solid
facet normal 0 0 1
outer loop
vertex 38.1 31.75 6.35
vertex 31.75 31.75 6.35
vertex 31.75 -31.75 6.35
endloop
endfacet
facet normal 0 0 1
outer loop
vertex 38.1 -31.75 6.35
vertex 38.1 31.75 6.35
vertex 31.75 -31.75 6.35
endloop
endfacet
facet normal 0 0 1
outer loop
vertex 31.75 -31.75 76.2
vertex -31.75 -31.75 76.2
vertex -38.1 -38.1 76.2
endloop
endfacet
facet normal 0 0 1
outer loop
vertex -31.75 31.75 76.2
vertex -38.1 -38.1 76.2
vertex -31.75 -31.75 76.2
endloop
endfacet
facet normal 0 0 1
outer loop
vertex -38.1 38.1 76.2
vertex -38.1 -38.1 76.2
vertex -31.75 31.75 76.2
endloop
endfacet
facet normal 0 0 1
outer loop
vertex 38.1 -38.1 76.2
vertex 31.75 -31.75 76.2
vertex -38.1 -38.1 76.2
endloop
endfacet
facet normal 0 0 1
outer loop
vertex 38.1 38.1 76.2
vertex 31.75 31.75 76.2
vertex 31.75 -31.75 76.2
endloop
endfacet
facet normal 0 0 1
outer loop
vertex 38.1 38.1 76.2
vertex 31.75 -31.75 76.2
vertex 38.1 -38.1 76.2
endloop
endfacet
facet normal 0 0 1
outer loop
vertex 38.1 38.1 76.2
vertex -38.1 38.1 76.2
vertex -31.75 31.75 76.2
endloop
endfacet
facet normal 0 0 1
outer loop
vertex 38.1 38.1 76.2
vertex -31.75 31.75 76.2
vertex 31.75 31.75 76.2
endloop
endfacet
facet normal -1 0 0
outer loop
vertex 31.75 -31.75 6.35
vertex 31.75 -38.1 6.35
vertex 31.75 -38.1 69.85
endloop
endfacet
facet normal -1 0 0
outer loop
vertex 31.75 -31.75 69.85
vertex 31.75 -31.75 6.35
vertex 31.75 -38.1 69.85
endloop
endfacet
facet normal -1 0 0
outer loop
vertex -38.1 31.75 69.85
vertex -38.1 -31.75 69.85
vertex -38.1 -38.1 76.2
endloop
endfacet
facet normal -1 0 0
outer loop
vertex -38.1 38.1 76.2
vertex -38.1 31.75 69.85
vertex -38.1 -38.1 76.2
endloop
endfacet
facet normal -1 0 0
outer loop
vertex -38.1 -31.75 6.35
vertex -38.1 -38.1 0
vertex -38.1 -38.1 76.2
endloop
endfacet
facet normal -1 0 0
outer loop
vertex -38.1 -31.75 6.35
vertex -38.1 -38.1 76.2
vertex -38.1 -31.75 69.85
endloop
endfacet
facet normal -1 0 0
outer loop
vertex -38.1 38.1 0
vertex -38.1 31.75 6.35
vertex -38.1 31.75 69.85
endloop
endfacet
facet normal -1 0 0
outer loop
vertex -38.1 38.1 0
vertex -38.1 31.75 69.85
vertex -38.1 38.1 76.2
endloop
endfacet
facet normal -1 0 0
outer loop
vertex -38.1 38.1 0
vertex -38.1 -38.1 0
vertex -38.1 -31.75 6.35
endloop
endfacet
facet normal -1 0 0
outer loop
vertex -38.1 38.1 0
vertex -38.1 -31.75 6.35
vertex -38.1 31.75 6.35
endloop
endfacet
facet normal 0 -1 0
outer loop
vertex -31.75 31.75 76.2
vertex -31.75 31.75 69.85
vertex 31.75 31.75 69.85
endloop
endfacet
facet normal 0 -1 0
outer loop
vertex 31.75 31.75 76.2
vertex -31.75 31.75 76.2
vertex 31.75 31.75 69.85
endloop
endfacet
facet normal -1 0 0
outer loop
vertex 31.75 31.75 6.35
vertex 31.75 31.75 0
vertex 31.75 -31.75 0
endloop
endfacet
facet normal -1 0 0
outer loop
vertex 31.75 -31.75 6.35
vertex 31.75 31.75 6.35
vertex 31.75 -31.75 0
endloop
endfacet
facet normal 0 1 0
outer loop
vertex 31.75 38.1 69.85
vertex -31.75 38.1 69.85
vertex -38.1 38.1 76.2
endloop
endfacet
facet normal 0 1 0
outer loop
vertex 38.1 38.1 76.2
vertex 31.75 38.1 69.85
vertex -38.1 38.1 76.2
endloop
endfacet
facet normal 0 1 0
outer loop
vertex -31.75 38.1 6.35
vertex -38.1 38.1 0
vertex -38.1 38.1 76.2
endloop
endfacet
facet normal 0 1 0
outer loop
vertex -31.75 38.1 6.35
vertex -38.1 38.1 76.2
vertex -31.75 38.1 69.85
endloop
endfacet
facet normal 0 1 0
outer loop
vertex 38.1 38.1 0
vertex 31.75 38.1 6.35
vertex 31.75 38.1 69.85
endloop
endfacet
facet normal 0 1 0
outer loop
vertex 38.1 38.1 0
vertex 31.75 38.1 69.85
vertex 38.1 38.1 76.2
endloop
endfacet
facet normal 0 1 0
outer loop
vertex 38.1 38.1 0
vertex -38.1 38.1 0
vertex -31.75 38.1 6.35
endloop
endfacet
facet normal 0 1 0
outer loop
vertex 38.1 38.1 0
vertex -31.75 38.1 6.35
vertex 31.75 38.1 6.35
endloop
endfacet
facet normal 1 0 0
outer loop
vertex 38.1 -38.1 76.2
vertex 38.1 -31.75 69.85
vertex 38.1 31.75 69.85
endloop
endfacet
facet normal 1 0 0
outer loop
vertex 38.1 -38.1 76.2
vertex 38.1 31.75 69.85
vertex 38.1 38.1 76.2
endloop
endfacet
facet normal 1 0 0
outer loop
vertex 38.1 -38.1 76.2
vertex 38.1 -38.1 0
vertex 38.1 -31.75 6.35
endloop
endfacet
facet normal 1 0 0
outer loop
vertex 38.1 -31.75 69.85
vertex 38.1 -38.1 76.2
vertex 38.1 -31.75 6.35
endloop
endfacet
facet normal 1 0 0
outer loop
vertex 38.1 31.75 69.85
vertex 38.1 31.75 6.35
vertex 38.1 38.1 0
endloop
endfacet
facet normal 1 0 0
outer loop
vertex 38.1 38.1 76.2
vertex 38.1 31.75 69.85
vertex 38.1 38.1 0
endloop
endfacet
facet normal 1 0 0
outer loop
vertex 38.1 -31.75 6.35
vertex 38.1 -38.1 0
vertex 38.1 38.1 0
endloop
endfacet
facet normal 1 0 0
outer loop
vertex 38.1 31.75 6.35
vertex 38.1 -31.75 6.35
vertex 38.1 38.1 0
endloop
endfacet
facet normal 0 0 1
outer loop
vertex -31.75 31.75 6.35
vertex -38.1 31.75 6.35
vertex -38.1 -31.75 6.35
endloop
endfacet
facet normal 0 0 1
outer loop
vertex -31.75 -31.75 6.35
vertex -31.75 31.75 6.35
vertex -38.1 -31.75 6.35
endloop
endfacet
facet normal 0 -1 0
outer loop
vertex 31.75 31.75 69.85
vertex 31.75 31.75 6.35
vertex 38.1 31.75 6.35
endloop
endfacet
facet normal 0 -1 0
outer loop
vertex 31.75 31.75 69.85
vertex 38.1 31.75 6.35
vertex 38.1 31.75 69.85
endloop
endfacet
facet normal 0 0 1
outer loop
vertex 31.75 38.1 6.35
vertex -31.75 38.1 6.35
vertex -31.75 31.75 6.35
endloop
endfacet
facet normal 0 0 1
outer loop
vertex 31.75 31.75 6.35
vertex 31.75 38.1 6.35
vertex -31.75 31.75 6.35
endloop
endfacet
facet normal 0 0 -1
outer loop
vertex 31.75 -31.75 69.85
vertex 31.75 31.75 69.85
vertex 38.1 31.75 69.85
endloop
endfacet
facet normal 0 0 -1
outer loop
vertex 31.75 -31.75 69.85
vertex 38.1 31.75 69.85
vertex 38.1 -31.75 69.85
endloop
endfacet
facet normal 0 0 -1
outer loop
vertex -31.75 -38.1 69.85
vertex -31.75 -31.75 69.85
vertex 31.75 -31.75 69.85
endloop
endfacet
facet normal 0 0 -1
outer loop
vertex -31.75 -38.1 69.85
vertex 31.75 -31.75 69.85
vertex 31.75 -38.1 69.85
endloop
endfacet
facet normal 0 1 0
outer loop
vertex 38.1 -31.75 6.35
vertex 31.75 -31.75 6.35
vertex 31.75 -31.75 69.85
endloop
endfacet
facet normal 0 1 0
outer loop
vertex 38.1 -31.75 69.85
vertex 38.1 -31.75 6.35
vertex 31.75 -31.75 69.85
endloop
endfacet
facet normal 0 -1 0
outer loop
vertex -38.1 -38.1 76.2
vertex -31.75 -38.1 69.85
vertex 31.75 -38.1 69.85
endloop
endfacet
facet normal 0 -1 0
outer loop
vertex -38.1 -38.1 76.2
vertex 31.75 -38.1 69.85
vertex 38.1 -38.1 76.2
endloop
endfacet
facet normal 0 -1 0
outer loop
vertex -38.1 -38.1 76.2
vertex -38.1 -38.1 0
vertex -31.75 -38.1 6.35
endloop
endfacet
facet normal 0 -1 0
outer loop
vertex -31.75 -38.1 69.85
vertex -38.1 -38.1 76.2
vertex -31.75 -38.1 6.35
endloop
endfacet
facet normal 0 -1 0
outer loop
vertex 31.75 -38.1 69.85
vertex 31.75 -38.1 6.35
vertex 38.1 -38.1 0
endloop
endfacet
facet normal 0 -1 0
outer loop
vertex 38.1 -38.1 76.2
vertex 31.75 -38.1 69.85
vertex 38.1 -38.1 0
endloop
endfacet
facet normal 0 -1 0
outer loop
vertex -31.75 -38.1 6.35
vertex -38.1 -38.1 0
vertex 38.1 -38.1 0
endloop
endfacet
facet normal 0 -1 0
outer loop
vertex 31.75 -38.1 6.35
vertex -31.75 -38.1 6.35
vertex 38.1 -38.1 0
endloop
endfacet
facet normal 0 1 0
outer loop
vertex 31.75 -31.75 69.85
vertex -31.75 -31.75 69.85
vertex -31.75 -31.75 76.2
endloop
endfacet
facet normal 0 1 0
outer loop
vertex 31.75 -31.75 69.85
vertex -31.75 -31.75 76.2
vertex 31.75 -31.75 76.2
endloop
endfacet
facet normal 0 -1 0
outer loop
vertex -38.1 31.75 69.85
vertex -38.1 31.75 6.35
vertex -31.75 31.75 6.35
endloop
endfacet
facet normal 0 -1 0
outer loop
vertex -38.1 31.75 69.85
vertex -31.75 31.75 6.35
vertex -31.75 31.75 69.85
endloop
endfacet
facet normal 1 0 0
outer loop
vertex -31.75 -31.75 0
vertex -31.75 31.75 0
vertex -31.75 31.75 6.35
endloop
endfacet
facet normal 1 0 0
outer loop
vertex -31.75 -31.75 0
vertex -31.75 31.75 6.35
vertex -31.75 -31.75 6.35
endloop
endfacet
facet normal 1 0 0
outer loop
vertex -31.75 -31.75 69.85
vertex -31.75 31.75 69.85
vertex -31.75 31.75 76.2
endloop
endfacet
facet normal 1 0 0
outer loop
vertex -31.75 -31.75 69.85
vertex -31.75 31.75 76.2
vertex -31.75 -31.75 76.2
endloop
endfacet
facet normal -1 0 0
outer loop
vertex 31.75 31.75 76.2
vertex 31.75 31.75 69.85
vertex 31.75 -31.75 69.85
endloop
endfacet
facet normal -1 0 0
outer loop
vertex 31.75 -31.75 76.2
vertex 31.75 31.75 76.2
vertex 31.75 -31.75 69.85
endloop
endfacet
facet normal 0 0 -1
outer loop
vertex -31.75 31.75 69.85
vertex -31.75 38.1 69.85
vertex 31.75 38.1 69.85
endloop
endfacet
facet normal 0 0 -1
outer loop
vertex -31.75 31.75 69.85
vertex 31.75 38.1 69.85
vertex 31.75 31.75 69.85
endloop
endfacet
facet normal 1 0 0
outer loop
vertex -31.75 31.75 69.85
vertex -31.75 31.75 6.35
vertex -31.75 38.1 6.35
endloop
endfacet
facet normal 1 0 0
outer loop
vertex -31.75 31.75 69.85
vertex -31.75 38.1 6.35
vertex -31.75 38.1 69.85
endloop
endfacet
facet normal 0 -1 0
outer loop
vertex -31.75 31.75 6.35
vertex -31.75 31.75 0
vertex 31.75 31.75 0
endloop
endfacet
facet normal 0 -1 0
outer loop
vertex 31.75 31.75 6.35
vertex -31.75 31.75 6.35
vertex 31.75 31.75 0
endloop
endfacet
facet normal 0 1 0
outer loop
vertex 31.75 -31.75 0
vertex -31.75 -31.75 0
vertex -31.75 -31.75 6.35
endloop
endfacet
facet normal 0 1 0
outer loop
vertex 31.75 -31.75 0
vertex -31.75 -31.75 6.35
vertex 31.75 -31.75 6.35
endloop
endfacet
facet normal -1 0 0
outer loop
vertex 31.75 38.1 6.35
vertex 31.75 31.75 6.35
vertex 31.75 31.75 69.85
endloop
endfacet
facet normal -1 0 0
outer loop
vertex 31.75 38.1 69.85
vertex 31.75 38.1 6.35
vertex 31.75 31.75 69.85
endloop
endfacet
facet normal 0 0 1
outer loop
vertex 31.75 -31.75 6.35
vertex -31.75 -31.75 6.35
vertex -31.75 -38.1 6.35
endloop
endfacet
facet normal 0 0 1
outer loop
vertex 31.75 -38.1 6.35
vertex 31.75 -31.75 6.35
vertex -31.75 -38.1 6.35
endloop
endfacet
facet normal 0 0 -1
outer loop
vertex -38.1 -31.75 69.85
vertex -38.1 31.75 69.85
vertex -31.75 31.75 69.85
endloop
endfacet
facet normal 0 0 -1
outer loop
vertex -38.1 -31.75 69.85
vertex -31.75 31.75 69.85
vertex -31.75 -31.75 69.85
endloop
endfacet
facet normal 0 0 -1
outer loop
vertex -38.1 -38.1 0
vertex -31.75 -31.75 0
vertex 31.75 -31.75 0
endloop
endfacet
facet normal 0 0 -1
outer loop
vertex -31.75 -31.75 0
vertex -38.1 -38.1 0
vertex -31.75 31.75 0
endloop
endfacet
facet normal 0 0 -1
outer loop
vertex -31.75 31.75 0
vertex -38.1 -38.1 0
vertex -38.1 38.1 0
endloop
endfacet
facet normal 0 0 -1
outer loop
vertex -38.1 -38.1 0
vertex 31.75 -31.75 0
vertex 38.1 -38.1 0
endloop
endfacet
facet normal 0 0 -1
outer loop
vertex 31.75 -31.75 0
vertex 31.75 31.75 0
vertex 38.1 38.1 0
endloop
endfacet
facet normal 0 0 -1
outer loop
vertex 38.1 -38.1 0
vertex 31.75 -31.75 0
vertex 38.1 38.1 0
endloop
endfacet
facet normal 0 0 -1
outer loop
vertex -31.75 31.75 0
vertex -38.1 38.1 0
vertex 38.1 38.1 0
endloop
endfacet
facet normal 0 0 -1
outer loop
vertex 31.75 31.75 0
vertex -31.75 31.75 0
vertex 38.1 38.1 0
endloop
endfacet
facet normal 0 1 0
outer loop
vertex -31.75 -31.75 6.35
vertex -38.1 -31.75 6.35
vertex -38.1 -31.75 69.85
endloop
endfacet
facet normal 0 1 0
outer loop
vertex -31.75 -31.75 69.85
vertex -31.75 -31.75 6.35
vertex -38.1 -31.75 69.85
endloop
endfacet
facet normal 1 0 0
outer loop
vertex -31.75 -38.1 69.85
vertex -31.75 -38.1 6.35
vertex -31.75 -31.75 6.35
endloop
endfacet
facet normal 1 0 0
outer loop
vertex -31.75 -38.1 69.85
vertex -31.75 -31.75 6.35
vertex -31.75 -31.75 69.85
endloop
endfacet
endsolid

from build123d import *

# Parameters (mm, degrees)
F0_W     = 76.2
F0_H     = 76.2
F1_DEPTH = 76.2
F2_W     = 63.5
F2_H     = 63.5
F3_DEPTH = 76.2
F4_W     = 63.5
F4_H     = 63.5
F5_DEPTH = 76.2
F6_W     = 63.5
F6_H     = 63.5
F7_DEPTH = 76.2


with BuildPart() as f1:
    # F0 (on Top) → F1 (new body)
    with BuildSketch(Plane.XY):
        Rectangle(F0_W, F0_H)
    extrude(amount=F1_DEPTH)

    # F2 (on face) → F3 (cut)
    with BuildSketch(Plane.XZ.offset(38.1)):
        with Locations((0, 38.1)):
            Rectangle(F2_W, F2_H)
    extrude(amount=-F3_DEPTH, mode=Mode.SUBTRACT)

    # F4 (on face) → F5 (cut)
    with BuildSketch(Plane(origin=(-38.1, 0, 0), x_dir=(0, -1, 0), z_dir=(-1, 0, 0))):
        with Locations((0, 38.1)):
            Rectangle(F4_W, F4_H)
    extrude(amount=-F5_DEPTH, mode=Mode.SUBTRACT)

    # F6 (on face) → F7 (cut)
    with BuildSketch(Plane(origin=(0, 0, 0), x_dir=(1, 0, 0), z_dir=(0, 0, -1))):
        Rectangle(F6_W, F6_H)
    extrude(amount=-F7_DEPTH, mode=Mode.SUBTRACT)


solid = f1.part
